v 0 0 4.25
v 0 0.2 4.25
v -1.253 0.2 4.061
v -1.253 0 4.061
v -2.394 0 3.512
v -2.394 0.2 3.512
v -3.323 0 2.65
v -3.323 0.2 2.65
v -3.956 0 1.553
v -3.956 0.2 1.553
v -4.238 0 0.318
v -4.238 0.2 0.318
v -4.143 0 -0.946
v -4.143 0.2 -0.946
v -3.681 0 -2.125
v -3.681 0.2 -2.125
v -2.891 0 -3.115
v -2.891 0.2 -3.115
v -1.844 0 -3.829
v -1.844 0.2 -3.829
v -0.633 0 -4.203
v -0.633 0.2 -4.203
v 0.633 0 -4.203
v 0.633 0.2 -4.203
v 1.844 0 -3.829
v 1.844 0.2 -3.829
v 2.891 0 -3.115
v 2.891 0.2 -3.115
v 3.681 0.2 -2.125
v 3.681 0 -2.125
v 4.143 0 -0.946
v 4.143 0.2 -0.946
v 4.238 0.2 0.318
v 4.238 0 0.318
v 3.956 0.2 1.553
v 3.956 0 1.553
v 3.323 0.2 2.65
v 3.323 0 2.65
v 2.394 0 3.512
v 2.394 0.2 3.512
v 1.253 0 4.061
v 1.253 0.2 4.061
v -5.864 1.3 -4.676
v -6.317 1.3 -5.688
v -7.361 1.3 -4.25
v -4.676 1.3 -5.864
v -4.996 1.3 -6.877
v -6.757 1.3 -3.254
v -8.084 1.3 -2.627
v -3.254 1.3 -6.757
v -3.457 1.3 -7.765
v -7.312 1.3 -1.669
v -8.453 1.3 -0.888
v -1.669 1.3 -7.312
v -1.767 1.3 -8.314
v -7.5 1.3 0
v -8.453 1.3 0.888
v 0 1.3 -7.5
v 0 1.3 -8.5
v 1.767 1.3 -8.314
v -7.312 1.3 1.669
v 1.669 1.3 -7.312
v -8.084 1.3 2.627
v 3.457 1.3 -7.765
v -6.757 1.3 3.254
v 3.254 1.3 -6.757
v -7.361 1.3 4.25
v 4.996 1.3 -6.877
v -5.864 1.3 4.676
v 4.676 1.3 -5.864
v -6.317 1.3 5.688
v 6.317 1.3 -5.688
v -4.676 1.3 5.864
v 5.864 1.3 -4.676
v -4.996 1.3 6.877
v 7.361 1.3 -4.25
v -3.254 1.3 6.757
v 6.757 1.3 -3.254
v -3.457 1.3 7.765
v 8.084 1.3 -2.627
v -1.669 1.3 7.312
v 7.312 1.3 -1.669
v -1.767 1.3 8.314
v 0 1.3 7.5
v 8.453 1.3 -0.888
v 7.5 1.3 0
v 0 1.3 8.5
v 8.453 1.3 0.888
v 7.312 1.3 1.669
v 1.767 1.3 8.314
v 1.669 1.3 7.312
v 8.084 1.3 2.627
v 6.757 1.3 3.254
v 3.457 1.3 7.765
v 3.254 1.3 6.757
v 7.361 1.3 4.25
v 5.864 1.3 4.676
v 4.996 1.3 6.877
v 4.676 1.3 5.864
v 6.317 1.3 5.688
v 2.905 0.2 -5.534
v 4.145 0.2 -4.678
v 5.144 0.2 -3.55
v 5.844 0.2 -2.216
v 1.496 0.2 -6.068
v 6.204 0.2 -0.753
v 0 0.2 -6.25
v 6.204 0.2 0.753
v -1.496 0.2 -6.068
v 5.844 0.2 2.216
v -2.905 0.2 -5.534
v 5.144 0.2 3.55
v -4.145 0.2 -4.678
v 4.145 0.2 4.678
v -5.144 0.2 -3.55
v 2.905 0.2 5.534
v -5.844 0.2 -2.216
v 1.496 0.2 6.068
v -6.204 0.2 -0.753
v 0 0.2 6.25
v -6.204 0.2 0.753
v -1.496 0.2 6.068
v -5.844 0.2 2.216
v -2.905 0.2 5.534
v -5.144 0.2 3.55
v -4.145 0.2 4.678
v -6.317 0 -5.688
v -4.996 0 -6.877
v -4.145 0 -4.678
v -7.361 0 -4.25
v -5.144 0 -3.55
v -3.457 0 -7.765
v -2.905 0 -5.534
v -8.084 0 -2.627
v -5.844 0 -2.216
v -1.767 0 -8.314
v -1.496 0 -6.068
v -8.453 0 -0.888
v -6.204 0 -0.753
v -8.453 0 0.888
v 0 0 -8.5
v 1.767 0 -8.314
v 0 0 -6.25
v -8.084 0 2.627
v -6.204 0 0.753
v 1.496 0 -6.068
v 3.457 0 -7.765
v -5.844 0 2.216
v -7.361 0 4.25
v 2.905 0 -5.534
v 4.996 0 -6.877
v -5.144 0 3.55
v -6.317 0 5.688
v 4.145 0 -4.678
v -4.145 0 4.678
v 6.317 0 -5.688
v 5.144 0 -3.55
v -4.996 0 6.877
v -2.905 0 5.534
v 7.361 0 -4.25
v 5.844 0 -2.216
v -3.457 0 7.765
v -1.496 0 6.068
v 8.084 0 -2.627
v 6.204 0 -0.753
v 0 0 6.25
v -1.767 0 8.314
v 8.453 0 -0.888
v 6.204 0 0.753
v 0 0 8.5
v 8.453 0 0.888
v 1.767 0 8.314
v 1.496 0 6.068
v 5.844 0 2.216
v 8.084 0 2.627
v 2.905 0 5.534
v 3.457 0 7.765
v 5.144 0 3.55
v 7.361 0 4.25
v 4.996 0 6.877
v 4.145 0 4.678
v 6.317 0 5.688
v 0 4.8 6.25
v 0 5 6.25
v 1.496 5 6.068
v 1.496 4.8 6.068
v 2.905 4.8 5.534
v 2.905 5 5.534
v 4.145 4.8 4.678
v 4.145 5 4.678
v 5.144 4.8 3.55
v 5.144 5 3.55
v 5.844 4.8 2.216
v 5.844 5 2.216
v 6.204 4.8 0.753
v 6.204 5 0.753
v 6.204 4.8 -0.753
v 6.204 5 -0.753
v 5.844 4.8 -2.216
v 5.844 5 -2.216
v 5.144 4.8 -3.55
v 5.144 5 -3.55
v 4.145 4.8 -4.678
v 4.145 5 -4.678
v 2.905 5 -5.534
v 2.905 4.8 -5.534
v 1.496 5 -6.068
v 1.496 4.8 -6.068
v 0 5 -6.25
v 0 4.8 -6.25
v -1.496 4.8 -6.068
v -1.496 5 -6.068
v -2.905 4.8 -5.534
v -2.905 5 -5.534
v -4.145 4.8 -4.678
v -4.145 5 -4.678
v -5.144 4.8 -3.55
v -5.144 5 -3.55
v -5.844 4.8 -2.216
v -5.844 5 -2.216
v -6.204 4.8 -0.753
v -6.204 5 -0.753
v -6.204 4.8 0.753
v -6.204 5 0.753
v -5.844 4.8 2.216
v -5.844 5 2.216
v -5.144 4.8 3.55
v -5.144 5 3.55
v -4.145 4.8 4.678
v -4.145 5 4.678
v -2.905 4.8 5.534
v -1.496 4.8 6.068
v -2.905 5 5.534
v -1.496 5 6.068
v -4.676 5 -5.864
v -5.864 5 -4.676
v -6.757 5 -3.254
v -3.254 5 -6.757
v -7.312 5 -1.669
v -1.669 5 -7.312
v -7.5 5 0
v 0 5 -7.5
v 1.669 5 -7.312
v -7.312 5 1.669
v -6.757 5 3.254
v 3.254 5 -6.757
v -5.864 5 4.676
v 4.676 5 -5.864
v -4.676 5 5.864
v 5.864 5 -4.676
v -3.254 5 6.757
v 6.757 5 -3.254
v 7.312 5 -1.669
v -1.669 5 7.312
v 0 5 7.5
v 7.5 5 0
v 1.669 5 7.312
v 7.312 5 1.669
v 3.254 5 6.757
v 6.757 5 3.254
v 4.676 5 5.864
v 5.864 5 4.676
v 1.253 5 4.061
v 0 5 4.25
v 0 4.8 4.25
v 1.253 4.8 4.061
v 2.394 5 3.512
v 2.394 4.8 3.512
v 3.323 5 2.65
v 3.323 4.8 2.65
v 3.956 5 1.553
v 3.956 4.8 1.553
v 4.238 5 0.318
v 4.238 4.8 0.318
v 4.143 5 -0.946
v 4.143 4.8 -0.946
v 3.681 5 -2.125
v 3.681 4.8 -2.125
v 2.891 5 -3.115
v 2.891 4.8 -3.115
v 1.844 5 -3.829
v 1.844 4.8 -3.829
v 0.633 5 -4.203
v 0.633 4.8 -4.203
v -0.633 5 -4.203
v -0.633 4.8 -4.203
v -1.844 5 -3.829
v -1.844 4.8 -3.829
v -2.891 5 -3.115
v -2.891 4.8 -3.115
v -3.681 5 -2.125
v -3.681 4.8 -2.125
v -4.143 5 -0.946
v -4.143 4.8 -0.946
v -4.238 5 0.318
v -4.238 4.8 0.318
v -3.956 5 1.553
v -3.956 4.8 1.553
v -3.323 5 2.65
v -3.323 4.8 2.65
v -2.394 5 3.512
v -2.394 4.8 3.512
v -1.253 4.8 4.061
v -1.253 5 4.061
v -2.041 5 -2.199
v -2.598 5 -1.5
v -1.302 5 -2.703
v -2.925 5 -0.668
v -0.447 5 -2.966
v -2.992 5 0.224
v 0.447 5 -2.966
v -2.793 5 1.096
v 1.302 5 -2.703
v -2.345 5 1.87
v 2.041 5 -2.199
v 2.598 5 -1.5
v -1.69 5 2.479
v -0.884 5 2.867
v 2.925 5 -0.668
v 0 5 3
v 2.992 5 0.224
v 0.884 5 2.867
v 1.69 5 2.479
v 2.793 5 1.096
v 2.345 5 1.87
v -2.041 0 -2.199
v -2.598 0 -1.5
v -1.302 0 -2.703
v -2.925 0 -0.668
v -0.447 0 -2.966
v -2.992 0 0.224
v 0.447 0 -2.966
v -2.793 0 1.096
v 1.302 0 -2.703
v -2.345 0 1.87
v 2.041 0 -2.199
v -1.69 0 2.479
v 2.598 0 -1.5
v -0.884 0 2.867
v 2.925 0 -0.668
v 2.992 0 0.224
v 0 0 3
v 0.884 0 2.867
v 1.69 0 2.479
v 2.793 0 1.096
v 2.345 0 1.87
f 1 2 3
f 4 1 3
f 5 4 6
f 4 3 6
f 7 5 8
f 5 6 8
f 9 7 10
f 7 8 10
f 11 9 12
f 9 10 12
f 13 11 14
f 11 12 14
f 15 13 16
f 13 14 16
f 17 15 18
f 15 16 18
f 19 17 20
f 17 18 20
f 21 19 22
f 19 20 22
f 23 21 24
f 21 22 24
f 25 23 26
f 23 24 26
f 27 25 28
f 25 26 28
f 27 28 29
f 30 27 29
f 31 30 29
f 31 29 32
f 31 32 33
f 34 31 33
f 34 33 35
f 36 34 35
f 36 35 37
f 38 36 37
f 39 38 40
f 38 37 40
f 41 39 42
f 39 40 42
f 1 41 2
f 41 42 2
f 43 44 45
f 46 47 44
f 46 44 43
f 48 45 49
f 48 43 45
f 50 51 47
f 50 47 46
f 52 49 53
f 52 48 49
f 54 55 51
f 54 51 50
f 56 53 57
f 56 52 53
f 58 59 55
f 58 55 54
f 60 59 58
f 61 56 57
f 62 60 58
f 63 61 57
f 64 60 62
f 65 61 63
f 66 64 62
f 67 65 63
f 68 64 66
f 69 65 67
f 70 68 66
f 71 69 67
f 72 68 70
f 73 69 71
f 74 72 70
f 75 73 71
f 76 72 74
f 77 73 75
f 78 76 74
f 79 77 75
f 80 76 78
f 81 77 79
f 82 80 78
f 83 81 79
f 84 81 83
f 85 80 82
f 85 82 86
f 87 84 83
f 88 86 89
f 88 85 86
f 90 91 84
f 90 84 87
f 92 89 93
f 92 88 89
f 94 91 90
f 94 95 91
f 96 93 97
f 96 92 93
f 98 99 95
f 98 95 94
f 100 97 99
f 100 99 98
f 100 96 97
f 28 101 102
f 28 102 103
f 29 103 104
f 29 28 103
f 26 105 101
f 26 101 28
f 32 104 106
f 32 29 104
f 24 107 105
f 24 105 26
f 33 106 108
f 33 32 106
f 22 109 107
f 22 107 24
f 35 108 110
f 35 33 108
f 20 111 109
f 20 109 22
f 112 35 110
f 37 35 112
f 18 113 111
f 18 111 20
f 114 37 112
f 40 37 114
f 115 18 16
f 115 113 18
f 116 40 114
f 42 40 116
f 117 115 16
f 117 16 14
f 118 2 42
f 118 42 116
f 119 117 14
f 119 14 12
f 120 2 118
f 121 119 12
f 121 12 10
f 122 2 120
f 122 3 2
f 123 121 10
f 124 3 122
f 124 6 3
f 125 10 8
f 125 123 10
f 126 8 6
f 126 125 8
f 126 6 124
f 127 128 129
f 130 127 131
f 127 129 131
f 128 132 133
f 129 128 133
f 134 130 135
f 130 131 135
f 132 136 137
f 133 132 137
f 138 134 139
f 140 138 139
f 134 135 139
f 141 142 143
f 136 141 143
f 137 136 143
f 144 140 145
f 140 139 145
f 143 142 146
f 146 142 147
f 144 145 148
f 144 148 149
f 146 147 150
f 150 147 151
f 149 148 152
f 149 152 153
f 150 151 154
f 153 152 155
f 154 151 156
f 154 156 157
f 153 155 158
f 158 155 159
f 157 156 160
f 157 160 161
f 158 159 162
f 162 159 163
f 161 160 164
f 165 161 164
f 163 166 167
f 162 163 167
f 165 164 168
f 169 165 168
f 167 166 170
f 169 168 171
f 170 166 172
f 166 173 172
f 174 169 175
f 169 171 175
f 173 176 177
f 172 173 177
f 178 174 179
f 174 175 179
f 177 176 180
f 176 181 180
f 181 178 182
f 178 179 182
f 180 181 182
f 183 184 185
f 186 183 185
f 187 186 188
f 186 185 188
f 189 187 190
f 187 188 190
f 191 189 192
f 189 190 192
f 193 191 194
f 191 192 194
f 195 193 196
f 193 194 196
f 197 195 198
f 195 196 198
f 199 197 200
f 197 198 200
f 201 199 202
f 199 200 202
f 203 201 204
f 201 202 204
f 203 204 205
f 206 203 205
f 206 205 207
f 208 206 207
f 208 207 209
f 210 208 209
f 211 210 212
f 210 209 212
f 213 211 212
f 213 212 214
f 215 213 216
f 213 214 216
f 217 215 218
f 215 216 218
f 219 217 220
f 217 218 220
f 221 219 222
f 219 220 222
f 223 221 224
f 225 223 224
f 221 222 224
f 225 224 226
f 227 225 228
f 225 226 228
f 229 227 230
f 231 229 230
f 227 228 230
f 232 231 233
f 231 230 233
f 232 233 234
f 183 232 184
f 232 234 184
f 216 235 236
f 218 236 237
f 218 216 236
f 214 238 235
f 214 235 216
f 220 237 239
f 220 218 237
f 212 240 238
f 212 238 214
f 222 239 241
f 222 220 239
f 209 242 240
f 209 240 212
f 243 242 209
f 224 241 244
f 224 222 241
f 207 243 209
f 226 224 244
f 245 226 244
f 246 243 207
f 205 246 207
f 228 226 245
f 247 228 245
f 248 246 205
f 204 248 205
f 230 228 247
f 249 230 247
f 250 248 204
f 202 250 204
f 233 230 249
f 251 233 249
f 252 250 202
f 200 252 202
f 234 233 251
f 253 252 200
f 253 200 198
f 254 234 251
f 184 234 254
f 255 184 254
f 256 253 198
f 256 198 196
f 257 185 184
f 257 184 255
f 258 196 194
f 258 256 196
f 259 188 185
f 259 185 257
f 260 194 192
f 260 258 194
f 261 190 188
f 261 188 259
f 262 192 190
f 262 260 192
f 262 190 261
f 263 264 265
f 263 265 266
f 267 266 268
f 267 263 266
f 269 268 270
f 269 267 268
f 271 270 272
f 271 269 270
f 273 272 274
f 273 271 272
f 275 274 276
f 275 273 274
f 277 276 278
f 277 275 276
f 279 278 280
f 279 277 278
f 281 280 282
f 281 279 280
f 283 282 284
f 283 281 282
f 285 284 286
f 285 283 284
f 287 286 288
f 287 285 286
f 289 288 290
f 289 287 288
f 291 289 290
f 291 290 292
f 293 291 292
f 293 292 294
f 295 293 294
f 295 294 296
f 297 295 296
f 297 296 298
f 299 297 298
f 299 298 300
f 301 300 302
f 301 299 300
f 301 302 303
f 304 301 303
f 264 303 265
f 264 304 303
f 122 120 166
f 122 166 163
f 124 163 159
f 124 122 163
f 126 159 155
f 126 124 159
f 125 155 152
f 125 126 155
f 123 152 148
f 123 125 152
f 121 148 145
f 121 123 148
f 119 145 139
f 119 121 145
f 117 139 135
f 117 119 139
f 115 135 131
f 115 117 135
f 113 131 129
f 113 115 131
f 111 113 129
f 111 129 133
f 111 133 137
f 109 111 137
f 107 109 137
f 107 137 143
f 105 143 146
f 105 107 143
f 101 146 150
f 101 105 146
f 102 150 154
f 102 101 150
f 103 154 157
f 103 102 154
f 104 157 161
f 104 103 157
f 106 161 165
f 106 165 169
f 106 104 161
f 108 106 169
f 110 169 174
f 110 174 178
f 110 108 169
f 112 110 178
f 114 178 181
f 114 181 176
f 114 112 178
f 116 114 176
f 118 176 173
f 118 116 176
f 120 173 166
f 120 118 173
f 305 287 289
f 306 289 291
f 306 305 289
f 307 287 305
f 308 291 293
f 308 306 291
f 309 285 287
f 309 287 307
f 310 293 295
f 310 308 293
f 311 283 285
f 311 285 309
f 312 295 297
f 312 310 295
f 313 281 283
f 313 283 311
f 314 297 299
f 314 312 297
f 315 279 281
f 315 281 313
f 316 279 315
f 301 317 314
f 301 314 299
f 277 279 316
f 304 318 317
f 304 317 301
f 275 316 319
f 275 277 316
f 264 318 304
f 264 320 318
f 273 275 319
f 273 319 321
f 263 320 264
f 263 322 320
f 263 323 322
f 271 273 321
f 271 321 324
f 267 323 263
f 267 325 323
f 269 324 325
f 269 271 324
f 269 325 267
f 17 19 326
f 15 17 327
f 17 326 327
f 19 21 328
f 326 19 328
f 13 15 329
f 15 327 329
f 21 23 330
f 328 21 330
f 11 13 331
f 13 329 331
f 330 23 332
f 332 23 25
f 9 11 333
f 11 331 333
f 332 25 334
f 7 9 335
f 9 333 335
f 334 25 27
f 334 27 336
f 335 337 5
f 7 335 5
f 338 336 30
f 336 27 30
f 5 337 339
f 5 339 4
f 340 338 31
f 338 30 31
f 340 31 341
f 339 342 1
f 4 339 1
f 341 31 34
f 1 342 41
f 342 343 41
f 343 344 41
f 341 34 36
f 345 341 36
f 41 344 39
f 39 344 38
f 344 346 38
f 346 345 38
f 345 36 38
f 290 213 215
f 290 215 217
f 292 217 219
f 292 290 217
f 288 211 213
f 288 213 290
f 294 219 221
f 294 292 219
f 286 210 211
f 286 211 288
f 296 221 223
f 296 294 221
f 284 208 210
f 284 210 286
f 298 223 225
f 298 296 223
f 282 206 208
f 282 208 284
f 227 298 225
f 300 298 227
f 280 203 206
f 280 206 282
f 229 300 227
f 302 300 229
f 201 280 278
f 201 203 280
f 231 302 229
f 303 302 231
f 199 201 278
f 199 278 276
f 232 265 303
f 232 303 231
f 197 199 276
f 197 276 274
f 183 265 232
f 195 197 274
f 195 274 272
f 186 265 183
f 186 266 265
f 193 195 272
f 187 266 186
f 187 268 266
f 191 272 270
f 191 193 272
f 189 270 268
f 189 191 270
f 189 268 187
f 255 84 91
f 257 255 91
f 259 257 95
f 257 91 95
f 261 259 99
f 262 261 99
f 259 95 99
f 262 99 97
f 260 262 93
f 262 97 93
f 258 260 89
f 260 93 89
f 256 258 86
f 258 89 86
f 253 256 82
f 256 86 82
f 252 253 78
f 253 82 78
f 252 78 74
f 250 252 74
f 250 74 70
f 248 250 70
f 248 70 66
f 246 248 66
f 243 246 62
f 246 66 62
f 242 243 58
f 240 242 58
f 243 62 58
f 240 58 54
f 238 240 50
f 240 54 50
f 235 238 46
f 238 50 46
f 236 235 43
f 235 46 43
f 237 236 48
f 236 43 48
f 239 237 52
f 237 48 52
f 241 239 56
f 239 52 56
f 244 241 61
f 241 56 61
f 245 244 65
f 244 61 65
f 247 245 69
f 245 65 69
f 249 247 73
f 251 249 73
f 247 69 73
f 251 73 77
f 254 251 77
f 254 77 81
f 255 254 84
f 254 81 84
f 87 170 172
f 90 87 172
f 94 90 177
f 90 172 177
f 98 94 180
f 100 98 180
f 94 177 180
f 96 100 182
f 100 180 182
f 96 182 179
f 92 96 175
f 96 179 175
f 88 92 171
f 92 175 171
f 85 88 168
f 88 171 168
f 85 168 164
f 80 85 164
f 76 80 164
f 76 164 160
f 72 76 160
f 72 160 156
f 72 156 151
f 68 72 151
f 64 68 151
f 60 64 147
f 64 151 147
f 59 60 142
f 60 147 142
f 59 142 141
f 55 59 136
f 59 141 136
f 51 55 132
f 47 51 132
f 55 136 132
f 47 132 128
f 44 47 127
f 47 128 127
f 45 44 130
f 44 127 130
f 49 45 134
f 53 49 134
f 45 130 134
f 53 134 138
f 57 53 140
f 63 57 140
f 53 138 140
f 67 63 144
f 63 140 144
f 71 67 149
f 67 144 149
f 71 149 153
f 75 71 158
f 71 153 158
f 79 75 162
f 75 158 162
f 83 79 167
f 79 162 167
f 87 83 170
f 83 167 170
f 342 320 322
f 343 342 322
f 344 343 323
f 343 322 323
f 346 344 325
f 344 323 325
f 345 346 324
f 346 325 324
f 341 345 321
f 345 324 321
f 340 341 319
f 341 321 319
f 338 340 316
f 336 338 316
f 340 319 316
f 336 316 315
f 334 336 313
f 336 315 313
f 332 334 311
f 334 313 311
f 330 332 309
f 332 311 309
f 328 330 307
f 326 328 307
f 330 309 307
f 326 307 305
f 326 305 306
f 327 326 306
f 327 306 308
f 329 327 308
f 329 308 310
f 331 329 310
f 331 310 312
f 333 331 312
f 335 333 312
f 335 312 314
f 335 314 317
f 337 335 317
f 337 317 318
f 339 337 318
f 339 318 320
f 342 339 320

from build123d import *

# Parameters (mm, degrees)
SKETCH_1_R          = 8.5
EXTRUDE_1_DEPTH     = 1.3
SKETCH_2_R          = 7.5
EXTRUDE_2_DEPTH     = 3.7
CUT_EXTRUDE_1_REACH = 15.019
SKETCH_3_R          = 3
SKETCH_4_R          = 6.25
SKETCH_4_R_2        = 4.25
CUT_EXTRUDE_2_DEPTH = 0.2
CUT_EXTRUDE_START   = -0.2
SKETCH_5_R          = 6.25
SKETCH_5_R_2        = 4.25
CUT_EXTRUDE_3_DEPTH = 0.2


with BuildPart() as part:
    # 草图1 → 凸台-拉伸1 (new body)
    with BuildSketch(Plane(origin=(0, 0, 0), x_dir=(1, 0, 0), z_dir=(0, 1, 0))):
        with Locations(Location((0, 0, 0), (0, 0, 270))):
            Circle(SKETCH_1_R)
    extrude(amount=EXTRUDE_1_DEPTH)

    # 草图2 → 凸台-拉伸2 (add)
    with BuildSketch(Plane(origin=(0, 1.3, 0), x_dir=(1, 0, 0), z_dir=(0, 1, 0))):
        with Locations(Location((0, 0, 0), (0, 0, 270))):
            Circle(SKETCH_2_R)
    extrude(amount=EXTRUDE_2_DEPTH)

    # 草图3 → 切除-拉伸1 (cut, up to next)
    with BuildSketch(Plane(origin=(0, 5, 0), x_dir=(1, 0, 0), z_dir=(0, 1, 0)), mode=Mode.PRIVATE) as cut_extrude_1_sk1:
        with Locations(Location((0, 0, 0), (0, 0, 270))):
            Circle(SKETCH_3_R)
    cut_extrude_1_tool1 = extrude(cut_extrude_1_sk1.sketch, amount=-CUT_EXTRUDE_1_REACH, mode=Mode.PRIVATE) & part.part
    add(cut_extrude_1_tool1.solids().sort_by_distance((0, 5, 0))[0], mode=Mode.SUBTRACT)

    # 草图4 → 切除-拉伸2 (cut)
    with BuildSketch(Plane(origin=(0, 5, 0), x_dir=(1, 0, 0), z_dir=(0, 1, 0))):
        with Locations(Location((0, 0, 0), (0, 0, 270))):
            Circle(SKETCH_4_R)
        with Locations(Location((0, 0, 0), (0, 0, 270))):
            Circle(SKETCH_4_R_2, mode=Mode.SUBTRACT)
    extrude(amount=-CUT_EXTRUDE_2_DEPTH, mode=Mode.SUBTRACT)

    # 草图5 → 切除-拉伸3 (cut)
    with BuildSketch(Plane.XZ.offset(CUT_EXTRUDE_START)):
        with Locations(Location((0, 0, 0), (0, 0, 90))):
            Circle(SKETCH_5_R)
        with Locations(Location((0, 0, 0), (0, 0, 90))):
            Circle(SKETCH_5_R_2, mode=Mode.SUBTRACT)
    extrude(amount=CUT_EXTRUDE_3_DEPTH, mode=Mode.SUBTRACT)


solid = part.part
